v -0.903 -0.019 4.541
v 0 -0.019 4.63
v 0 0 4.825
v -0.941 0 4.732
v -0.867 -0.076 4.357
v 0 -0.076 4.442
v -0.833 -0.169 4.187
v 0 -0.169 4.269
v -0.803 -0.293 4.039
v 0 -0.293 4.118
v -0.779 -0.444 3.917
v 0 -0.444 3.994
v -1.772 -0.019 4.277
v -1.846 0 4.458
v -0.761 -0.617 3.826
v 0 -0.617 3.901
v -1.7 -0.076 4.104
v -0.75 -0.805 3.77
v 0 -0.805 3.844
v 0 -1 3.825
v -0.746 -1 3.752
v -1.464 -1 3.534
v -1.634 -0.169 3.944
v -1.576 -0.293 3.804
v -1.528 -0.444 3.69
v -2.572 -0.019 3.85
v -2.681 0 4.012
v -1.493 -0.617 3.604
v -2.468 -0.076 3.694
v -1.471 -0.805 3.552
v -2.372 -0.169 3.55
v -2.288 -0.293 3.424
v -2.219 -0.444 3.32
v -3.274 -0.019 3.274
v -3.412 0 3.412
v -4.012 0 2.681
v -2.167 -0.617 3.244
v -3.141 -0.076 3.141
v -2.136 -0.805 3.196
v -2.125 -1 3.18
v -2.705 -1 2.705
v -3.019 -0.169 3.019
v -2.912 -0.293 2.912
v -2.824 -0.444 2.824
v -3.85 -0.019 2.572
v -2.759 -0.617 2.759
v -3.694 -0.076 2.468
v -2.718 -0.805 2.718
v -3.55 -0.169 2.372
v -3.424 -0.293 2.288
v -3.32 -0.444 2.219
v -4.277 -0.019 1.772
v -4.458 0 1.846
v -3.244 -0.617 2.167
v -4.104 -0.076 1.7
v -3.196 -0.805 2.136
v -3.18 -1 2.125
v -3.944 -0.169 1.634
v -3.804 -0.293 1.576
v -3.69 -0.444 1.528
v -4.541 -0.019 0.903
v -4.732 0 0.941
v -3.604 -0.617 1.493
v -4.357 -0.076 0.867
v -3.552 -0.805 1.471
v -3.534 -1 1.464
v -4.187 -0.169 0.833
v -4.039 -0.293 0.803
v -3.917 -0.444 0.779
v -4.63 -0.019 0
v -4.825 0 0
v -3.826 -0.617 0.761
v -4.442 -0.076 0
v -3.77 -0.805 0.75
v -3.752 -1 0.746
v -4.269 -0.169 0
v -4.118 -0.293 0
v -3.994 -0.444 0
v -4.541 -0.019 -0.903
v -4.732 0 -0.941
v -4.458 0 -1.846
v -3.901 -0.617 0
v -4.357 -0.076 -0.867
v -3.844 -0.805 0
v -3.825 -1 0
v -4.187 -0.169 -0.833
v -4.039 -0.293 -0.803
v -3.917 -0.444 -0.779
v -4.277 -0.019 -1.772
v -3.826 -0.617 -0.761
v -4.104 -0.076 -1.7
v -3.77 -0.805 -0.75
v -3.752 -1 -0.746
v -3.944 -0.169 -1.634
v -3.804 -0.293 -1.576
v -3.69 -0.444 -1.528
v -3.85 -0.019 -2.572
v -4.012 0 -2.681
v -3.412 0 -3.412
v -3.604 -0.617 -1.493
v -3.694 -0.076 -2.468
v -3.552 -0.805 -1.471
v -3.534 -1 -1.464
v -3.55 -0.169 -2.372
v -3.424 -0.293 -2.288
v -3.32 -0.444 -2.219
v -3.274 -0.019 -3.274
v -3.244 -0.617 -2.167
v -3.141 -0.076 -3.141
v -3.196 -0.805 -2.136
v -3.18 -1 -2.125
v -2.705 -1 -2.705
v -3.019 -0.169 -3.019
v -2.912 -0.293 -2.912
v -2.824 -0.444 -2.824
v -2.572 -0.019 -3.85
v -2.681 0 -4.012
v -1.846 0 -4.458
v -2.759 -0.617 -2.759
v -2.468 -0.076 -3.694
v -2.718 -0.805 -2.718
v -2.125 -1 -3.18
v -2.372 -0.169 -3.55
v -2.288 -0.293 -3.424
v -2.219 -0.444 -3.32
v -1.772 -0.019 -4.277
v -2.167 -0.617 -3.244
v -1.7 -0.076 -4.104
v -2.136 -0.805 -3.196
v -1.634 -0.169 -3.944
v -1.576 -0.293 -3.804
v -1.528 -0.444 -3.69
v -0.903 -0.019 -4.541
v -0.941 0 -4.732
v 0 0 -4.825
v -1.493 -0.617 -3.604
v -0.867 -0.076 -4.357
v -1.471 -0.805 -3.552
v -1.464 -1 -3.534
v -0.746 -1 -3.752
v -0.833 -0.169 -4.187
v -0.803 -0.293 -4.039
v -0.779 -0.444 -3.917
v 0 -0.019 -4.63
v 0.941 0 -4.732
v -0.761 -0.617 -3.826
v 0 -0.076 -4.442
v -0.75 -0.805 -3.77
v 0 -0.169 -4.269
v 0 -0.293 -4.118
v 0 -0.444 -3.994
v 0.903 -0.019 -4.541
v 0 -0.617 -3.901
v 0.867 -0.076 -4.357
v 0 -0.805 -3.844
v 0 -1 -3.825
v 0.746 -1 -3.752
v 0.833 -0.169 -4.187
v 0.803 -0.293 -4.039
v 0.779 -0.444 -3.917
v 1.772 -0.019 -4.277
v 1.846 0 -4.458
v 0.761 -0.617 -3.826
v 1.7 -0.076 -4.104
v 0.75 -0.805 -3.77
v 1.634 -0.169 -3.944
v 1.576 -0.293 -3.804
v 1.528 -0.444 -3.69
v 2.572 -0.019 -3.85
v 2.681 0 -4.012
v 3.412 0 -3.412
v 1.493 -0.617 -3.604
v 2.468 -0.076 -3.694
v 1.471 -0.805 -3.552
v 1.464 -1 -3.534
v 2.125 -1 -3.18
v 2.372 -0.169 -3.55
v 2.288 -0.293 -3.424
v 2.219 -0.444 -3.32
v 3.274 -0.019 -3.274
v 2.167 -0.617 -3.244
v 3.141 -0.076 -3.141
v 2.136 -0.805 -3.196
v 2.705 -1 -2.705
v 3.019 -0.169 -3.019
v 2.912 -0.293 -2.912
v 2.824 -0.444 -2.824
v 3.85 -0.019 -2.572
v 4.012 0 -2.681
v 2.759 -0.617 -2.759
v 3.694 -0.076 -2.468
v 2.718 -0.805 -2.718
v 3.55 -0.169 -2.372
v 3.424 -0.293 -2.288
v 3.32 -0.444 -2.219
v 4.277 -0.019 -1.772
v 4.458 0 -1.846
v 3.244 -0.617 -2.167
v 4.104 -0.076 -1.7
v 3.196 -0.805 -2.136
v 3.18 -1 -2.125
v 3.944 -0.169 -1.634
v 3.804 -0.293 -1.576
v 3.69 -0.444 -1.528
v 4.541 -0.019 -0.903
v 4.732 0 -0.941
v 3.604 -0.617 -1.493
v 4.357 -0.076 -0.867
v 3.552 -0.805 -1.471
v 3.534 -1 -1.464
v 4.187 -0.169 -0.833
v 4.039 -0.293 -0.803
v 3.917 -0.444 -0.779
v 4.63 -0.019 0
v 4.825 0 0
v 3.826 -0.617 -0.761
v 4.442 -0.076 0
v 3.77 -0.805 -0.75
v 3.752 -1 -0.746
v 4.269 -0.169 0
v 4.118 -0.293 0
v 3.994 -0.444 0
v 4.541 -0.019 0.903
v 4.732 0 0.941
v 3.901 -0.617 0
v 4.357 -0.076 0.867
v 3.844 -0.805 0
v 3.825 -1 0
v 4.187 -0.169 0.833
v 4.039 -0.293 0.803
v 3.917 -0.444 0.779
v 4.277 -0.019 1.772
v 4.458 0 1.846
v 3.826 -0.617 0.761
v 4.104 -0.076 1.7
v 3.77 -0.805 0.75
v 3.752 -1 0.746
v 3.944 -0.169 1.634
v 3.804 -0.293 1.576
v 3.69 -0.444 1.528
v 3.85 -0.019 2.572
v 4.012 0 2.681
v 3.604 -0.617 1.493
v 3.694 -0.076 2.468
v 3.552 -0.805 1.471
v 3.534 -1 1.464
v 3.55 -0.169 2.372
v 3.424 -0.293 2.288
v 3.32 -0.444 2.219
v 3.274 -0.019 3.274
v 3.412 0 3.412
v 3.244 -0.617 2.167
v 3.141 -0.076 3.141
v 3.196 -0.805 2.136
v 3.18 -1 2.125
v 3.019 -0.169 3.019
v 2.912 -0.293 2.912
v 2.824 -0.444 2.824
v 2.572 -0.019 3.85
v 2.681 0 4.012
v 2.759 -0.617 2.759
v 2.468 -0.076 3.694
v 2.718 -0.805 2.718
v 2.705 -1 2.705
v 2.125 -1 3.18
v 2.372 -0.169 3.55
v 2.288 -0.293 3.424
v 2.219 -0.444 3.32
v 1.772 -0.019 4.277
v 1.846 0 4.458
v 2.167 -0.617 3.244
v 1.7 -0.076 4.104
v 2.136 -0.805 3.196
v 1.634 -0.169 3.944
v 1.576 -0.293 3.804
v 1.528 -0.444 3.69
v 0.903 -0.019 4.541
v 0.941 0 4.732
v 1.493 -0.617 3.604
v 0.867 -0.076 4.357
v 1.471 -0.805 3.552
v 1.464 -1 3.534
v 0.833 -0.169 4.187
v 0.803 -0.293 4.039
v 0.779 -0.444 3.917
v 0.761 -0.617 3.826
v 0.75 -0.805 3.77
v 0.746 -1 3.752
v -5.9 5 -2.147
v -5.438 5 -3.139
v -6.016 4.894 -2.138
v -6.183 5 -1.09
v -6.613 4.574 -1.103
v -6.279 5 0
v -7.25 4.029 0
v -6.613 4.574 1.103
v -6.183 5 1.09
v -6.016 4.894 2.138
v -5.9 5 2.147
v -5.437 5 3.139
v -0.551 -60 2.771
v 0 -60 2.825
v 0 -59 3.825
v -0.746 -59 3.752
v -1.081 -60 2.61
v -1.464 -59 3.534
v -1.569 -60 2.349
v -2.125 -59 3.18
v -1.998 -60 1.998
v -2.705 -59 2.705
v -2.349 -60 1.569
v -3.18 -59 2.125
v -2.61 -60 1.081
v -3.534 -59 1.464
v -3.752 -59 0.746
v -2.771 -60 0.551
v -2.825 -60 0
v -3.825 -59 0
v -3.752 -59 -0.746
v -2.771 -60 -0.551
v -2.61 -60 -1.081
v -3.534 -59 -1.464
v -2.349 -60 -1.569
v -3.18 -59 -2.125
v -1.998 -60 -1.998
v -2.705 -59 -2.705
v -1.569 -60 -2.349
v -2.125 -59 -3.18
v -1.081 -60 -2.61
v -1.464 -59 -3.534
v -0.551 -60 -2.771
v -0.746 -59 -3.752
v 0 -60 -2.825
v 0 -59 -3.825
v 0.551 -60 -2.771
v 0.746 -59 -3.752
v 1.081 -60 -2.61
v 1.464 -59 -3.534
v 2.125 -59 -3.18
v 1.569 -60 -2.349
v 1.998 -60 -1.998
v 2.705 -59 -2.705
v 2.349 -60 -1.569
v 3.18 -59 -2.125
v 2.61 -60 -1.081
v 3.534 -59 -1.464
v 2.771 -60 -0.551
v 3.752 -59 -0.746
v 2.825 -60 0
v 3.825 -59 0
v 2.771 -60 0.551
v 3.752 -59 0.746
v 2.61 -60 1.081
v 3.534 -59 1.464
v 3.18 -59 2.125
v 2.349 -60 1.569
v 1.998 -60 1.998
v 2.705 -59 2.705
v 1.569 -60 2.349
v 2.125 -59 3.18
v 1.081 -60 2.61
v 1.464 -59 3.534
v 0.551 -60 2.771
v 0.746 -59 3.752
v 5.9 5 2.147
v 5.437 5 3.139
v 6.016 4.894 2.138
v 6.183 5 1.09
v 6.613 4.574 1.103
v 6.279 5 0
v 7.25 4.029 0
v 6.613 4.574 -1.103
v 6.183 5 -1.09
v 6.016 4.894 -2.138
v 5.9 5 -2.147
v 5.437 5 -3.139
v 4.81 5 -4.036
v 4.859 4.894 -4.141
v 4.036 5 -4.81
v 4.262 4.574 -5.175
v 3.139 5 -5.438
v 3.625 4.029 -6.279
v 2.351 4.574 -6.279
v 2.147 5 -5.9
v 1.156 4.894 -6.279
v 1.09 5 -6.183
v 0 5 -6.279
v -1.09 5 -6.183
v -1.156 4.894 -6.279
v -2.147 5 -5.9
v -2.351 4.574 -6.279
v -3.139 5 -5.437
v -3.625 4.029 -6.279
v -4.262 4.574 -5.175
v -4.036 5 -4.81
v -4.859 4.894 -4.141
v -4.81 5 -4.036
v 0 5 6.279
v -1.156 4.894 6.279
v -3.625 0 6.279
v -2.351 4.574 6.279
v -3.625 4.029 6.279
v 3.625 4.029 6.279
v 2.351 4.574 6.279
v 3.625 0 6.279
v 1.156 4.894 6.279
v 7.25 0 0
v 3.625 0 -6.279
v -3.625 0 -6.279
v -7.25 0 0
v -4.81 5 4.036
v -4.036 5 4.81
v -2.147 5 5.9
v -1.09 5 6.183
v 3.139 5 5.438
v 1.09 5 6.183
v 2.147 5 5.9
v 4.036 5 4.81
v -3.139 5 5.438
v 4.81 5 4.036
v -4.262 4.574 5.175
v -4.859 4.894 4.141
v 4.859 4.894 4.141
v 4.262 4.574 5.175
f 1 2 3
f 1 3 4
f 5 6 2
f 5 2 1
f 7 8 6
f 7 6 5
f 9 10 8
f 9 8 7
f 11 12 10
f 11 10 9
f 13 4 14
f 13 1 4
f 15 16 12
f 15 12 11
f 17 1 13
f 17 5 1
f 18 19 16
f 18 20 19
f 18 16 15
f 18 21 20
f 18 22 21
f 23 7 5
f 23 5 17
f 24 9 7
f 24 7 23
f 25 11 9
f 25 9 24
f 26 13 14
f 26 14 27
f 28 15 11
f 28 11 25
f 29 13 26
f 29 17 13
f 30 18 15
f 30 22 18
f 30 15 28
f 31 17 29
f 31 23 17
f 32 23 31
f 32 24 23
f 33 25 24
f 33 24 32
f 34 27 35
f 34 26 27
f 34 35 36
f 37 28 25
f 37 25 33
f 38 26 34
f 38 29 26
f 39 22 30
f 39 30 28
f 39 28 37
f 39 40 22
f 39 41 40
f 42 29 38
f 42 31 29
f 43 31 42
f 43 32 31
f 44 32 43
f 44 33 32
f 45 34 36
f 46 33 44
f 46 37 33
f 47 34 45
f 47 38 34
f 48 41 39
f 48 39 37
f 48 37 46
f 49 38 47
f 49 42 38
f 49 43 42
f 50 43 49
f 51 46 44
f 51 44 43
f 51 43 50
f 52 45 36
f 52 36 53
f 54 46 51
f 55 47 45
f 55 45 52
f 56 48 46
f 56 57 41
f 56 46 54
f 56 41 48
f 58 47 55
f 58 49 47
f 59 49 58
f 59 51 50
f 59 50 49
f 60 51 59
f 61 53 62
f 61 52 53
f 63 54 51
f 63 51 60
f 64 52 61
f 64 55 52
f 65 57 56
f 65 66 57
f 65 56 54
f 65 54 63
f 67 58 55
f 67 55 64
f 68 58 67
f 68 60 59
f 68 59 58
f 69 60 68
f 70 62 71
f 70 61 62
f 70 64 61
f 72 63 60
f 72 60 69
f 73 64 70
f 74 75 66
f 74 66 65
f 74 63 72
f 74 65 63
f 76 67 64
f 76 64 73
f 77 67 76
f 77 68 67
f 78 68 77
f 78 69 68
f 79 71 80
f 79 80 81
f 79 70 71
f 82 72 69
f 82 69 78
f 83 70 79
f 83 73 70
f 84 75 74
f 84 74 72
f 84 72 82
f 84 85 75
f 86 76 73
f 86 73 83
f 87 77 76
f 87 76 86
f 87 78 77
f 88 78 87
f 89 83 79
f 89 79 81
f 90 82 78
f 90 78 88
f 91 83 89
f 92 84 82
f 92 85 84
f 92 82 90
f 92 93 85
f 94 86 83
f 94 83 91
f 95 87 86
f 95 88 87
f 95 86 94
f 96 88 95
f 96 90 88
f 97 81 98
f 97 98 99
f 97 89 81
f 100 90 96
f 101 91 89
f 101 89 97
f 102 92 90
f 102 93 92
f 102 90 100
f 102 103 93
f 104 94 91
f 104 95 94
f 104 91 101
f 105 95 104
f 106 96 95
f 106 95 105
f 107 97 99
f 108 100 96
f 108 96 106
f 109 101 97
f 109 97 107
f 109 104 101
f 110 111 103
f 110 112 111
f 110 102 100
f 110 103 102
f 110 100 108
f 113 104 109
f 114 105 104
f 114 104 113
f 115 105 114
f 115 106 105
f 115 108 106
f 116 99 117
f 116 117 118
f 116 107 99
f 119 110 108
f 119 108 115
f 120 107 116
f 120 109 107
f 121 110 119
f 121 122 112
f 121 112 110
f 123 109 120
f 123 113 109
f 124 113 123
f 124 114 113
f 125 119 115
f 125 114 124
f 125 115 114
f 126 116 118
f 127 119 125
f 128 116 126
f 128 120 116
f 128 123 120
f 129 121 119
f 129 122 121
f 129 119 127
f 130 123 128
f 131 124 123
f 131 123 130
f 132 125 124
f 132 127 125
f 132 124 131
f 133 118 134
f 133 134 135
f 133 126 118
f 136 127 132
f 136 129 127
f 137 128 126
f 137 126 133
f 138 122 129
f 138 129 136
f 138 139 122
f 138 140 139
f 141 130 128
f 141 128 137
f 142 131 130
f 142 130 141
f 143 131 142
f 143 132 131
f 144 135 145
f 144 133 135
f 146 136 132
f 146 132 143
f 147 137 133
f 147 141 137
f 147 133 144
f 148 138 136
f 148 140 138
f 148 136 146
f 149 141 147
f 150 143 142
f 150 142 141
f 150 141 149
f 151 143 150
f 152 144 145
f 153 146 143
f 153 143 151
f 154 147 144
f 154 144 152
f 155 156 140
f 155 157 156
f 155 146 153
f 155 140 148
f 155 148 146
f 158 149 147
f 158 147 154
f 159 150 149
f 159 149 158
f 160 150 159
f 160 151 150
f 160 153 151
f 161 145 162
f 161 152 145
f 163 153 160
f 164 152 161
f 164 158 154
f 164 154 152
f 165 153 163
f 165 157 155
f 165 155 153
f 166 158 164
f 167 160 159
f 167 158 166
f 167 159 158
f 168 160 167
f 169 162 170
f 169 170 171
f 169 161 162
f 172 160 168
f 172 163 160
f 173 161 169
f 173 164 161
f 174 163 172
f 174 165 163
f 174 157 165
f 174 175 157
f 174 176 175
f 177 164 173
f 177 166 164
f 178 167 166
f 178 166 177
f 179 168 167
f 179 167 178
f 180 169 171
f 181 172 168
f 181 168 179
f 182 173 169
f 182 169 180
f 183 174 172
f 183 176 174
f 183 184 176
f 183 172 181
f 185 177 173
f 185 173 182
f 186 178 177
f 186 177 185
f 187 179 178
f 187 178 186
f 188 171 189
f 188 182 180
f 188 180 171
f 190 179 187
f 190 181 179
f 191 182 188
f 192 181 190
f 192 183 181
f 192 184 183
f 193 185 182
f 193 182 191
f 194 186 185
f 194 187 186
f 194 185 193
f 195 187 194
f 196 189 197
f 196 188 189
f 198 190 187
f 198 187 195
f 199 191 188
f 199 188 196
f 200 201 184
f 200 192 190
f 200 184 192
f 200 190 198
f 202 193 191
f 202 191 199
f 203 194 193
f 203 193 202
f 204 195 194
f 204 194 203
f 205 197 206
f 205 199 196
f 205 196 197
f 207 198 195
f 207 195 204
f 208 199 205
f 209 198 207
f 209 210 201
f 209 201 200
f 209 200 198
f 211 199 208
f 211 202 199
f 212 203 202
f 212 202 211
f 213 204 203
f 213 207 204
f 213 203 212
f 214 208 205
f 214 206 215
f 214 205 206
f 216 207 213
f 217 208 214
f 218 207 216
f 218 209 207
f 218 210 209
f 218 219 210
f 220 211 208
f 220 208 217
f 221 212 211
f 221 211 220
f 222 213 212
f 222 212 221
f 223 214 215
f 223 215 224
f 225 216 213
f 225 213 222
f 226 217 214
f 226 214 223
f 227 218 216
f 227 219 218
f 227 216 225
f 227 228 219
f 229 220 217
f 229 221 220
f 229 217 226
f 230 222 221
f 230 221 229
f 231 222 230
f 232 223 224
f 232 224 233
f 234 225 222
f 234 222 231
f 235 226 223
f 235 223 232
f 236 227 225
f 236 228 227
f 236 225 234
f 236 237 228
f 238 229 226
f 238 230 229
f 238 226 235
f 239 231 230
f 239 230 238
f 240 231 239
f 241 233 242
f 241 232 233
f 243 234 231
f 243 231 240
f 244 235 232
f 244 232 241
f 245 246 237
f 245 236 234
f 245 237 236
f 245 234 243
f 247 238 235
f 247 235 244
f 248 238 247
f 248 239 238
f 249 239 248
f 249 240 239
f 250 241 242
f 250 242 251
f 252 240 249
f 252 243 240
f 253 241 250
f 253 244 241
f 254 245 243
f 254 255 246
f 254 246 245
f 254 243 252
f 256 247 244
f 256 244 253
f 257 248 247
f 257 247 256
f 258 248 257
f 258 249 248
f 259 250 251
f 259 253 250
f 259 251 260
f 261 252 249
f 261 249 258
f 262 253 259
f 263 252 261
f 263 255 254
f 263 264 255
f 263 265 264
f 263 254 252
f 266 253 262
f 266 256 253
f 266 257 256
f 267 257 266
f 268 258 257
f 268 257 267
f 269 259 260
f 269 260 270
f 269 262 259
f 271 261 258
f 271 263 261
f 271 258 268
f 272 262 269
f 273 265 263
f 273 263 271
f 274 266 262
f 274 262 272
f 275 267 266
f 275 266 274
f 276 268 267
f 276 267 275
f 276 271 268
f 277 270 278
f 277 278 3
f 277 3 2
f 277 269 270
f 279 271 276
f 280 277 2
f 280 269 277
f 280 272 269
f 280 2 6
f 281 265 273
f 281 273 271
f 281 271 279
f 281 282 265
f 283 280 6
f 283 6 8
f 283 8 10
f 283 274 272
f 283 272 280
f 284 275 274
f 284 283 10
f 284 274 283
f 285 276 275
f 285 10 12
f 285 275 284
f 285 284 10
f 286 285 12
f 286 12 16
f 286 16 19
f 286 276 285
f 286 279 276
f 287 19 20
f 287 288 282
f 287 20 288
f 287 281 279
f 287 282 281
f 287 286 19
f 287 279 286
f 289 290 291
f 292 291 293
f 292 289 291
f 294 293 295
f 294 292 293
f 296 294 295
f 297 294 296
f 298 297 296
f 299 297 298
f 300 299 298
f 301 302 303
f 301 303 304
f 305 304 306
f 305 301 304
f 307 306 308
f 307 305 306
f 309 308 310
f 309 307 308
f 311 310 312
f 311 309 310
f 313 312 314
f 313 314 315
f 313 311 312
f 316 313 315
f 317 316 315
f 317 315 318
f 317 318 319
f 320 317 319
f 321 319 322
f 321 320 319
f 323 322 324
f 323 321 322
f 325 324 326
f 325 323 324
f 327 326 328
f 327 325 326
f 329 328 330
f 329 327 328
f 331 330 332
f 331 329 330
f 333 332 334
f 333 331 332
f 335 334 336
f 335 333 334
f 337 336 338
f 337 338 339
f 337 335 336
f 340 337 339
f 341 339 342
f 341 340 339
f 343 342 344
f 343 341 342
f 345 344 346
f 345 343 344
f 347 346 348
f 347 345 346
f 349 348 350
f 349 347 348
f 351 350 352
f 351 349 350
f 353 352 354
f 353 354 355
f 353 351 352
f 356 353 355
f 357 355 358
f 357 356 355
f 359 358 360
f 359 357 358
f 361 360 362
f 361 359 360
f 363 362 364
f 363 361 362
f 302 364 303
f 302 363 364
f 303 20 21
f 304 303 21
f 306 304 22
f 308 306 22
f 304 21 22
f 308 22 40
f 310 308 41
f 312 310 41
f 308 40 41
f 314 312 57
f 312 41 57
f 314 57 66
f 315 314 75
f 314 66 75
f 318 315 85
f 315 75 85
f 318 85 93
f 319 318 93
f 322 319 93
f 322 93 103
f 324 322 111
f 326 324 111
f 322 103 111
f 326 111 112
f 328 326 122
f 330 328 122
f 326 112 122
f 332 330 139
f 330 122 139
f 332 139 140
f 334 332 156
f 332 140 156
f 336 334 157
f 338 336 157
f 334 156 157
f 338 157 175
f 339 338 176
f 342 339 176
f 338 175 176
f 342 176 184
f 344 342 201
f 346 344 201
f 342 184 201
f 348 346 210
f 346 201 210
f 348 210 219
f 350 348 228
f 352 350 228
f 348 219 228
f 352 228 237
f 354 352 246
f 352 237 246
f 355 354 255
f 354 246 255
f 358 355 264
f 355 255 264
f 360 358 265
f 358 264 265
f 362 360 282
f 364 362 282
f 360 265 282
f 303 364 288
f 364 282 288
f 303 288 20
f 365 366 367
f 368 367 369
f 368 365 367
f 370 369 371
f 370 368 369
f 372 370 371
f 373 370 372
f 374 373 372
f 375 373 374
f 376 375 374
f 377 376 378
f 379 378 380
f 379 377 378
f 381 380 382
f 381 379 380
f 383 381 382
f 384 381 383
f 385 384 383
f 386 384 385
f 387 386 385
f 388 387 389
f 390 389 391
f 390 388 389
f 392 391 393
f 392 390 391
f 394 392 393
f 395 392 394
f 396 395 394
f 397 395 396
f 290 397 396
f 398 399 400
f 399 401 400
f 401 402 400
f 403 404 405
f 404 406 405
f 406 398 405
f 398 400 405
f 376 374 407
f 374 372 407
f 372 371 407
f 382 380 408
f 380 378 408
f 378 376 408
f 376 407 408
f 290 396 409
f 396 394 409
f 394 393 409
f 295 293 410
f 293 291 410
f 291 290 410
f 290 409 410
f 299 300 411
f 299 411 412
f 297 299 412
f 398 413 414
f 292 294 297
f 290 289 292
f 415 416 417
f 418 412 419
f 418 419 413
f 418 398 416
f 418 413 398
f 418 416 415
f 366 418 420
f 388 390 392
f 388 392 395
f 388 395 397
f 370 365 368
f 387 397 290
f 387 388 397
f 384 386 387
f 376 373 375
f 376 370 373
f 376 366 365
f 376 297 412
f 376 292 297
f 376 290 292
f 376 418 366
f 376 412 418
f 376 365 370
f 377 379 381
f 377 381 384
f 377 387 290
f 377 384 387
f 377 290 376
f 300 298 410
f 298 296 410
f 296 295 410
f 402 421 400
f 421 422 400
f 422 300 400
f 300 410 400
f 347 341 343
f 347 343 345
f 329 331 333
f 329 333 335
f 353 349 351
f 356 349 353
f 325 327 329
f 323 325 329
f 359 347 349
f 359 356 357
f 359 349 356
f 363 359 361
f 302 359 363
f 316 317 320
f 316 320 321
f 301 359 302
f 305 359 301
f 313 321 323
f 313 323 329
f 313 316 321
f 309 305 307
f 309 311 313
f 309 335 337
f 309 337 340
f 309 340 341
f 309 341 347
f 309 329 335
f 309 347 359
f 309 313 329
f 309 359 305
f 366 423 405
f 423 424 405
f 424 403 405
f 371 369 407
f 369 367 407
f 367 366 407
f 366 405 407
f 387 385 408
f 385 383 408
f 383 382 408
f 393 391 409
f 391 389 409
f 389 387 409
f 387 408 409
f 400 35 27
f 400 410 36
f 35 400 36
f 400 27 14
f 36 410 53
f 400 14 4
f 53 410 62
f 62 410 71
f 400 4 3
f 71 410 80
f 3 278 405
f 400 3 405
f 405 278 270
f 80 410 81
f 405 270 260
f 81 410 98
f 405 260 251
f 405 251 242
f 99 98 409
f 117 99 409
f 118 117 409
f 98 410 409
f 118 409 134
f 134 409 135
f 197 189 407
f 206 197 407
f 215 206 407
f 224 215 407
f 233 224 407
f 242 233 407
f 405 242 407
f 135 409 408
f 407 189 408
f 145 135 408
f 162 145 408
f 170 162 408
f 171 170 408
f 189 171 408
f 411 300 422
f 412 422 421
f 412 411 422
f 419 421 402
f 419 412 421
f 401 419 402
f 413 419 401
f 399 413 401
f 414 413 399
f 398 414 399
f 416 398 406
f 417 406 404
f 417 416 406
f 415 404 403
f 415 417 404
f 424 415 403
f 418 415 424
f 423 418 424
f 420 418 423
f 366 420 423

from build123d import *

# Parameters (mm, degrees)
EXTRUDE_1_DEPTH     = 5
SKETCH_8_OUTSIDE_W  = 22.464
SKETCH_8_OUTSIDE_H  = 20.522
SKETCH_8_OUTSIDE_R  = 6.278684177
CUT_EXTRUDE_1_DEPTH = 1
CUT_EXTRUDE_1_DRAFT = -45
SKETCH_9_R          = 3.825
BOLT_LENGTH_DEPTH   = 60
FILLET_1_R          = 1
CHAMFER_1_SIZE      = 1


with BuildPart() as part:
    # Эскиз6 → Бобышка-Вытянуть1 (new body)
    with BuildSketch(Plane(origin=(0, 0, 0), x_dir=(1, 0, 0), z_dir=(0, 1, 0))):
        Polygon((7.25, 0), (3.625, 6.278684177), (-3.625, 6.278684177), (-7.25, 0), (-3.625, -6.278684177), (3.625, -6.278684177), align=None)
    extrude(amount=EXTRUDE_1_DEPTH)


with BuildPart() as cut_extrude_1_tool:
    # Эскиз8 outside → Вырез-Вытянуть1 (with draft: the straight prism first)
    with BuildSketch(Plane(origin=(0, 5, 0), x_dir=(1, 0, 0), z_dir=(0, 1, 0))):
        Rectangle(SKETCH_8_OUTSIDE_W, SKETCH_8_OUTSIDE_H)
        Circle(SKETCH_8_OUTSIDE_R, mode=Mode.SUBTRACT)
    extrude(amount=-CUT_EXTRUDE_1_DEPTH)
    # Вырез-Вытянуть1: the draft: its side faces are tilted about the plane it starts from
    cut_extrude_1_sides = [cut_extrude_1_tool.faces().sort_by_distance(p)[0] for p in [
        (0, 4.5, 10.261),
        (11.232, 4.5, 0),
        (0, 4.5, -10.261),
        (-11.232, 4.5, 0),
        (-6.278684177, 4.5, 0),
    ]]
    draft(cut_extrude_1_sides, Plane(origin=(0, 5, 0), x_dir=(1, 0, 0), z_dir=(0, 1, 0)), CUT_EXTRUDE_1_DRAFT)


with BuildPart() as part_1:
    add(part.part)

    # Вырез-Вытянуть1: cut by cut_extrude_1_tool
    add(cut_extrude_1_tool.part, mode=Mode.SUBTRACT)

    # Эскиз9 → bolt length (add)
    with BuildSketch(Plane.XZ):
        with Locations(Location((0, 0, 0), (0, 0, 90))):  # turned: the seam where the file's is
            Circle(SKETCH_9_R)
    extrude(amount=BOLT_LENGTH_DEPTH)

    # Скругление1
    fillet_1_edges = [part_1.edges().sort_by_distance(p)[0] for p in [
        (0, 0, -3.825),
    ]]
    fillet(fillet_1_edges, radius=FILLET_1_R)

    # Фаска1
    chamfer_1_edges = [part_1.edges().sort_by_distance(p)[0] for p in [
        (0, -60, -3.825),
    ]]
    chamfer(chamfer_1_edges, length=CHAMFER_1_SIZE)


solid = part_1.part
